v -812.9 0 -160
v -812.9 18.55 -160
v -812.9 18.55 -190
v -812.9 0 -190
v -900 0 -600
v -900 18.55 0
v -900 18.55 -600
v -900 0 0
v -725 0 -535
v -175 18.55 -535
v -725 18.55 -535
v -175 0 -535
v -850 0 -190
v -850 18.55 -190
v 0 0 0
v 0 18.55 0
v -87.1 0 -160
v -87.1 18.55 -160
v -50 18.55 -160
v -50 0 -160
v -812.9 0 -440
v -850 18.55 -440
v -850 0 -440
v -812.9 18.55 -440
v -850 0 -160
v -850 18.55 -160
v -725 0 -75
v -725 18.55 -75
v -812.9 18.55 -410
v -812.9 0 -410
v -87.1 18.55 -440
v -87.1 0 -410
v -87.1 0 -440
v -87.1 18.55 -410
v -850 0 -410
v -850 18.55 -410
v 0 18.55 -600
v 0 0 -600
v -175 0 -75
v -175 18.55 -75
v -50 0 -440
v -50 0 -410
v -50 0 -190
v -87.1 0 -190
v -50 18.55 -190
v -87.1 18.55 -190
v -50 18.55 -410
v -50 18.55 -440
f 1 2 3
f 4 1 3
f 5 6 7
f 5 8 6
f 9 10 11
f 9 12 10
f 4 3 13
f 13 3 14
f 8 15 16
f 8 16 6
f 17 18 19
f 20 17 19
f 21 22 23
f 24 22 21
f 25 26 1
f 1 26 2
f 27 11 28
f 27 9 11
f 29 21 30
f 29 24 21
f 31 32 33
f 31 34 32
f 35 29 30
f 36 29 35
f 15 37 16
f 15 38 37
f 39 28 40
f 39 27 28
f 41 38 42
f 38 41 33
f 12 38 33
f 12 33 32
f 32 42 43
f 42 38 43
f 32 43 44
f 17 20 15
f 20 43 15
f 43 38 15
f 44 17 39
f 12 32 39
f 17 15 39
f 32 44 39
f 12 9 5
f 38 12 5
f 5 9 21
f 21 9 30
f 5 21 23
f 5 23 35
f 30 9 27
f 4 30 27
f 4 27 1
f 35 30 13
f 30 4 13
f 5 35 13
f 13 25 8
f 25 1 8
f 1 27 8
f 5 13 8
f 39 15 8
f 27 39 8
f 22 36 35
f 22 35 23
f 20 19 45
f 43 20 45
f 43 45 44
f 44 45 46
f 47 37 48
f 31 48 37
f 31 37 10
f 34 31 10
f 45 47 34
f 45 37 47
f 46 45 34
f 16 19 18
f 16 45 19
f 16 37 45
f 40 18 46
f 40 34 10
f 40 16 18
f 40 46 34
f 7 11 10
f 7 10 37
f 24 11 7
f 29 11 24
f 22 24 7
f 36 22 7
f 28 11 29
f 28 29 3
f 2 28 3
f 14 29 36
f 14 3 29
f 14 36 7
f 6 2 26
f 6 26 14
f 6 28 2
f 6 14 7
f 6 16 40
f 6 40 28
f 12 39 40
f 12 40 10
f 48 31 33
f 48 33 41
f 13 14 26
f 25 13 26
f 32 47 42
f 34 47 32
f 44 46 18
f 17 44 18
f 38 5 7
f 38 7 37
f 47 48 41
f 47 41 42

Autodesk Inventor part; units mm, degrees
ref_plane "YZ Plane" through (0, 0, 0) normal (1, 0, 0) x (0, 1, 0)
ref_plane "XZ Plane" through (0, 0, 0) normal (0, 1, 0) x (-1, 0, 0)
ref_plane "XY Plane" through (0, 0, 0) normal (0, 0, 1) x (1, 0, 0)
sketch "Sketch1" plane through (0, 0, 0) normal (0, 1, 0) x (-1, 0, 0)
  line L0 (0, 0) -> (900, 0)
  line L1 (900, 0) -> (900, -600)
  line L2 (900, -600) -> (0, -600)
  line L3 (0, -600) -> (0, 0)
  line L4 (725, -75) -> (175, -75)
  line L5 (175, -75) -> (175, -535)
  line L6 (175, -535) -> (725, -535)
  line L7 (725, -535) -> (725, -75)
  dimension "d0" = 900
  dimension "d1" = 600
  dimension "d23" = 175
  dimension "d24" = 75
  dimension "d25" = 460
  dimension "d26" = 550
extrude "Extrusion4" add sketch "Sketch1" along normal blind 18.55
sketch "Sketch4" plane through (0, 18.55, 0) normal (0, 1, 0) x (1, 0, 0)
  line L0 (-850, 440) -> (-812.9, 440)
  line L1 (-812.9, 440) -> (-812.9, 410)
  line L2 (-812.9, 410) -> (-850, 410)
  line L3 (-850, 410) -> (-850, 440)
  line L4 (-850, 160) -> (-812.9, 160)
  line L5 (-812.9, 160) -> (-812.9, 190)
  line L6 (-812.9, 190) -> (-850, 190)
  line L7 (-850, 190) -> (-850, 160)
  line L8 (-87.1, 440) -> (-50, 440)
  line L9 (-50, 440) -> (-50, 410)
  line L10 (-50, 410) -> (-87.1, 410)
  line L11 (-87.1, 410) -> (-87.1, 440)
  line L12 (-87.1, 160) -> (-50, 160)
  line L13 (-50, 160) -> (-50, 190)
  line L14 (-50, 190) -> (-87.1, 190)
  line L15 (-87.1, 190) -> (-87.1, 160)
  line L16 (0, 600) -> (-900, 600) projected
  line L17 (-900, 600) -> (-900, 0) projected
  line L18 (-900, 0) -> (0, 0) projected
  line L19 (0, 0) -> (0, 600) projected
  dimension "d29" = 160
  dimension "d30" = 50
  dimension "d33" = 30
  dimension "d34" = 37.1
  dimension "d35" = 30
  dimension "d36" = 50
  dimension "d39" = 160
extrude "Extrusion5" cut sketch "Sketch4" against normal blind 50 contours L0 L1 L2 L3 | L7 L6 L5 L4 | L8 L9 L10 L11 | L15 L14 L13 L12
properties part number "Table_plate"
